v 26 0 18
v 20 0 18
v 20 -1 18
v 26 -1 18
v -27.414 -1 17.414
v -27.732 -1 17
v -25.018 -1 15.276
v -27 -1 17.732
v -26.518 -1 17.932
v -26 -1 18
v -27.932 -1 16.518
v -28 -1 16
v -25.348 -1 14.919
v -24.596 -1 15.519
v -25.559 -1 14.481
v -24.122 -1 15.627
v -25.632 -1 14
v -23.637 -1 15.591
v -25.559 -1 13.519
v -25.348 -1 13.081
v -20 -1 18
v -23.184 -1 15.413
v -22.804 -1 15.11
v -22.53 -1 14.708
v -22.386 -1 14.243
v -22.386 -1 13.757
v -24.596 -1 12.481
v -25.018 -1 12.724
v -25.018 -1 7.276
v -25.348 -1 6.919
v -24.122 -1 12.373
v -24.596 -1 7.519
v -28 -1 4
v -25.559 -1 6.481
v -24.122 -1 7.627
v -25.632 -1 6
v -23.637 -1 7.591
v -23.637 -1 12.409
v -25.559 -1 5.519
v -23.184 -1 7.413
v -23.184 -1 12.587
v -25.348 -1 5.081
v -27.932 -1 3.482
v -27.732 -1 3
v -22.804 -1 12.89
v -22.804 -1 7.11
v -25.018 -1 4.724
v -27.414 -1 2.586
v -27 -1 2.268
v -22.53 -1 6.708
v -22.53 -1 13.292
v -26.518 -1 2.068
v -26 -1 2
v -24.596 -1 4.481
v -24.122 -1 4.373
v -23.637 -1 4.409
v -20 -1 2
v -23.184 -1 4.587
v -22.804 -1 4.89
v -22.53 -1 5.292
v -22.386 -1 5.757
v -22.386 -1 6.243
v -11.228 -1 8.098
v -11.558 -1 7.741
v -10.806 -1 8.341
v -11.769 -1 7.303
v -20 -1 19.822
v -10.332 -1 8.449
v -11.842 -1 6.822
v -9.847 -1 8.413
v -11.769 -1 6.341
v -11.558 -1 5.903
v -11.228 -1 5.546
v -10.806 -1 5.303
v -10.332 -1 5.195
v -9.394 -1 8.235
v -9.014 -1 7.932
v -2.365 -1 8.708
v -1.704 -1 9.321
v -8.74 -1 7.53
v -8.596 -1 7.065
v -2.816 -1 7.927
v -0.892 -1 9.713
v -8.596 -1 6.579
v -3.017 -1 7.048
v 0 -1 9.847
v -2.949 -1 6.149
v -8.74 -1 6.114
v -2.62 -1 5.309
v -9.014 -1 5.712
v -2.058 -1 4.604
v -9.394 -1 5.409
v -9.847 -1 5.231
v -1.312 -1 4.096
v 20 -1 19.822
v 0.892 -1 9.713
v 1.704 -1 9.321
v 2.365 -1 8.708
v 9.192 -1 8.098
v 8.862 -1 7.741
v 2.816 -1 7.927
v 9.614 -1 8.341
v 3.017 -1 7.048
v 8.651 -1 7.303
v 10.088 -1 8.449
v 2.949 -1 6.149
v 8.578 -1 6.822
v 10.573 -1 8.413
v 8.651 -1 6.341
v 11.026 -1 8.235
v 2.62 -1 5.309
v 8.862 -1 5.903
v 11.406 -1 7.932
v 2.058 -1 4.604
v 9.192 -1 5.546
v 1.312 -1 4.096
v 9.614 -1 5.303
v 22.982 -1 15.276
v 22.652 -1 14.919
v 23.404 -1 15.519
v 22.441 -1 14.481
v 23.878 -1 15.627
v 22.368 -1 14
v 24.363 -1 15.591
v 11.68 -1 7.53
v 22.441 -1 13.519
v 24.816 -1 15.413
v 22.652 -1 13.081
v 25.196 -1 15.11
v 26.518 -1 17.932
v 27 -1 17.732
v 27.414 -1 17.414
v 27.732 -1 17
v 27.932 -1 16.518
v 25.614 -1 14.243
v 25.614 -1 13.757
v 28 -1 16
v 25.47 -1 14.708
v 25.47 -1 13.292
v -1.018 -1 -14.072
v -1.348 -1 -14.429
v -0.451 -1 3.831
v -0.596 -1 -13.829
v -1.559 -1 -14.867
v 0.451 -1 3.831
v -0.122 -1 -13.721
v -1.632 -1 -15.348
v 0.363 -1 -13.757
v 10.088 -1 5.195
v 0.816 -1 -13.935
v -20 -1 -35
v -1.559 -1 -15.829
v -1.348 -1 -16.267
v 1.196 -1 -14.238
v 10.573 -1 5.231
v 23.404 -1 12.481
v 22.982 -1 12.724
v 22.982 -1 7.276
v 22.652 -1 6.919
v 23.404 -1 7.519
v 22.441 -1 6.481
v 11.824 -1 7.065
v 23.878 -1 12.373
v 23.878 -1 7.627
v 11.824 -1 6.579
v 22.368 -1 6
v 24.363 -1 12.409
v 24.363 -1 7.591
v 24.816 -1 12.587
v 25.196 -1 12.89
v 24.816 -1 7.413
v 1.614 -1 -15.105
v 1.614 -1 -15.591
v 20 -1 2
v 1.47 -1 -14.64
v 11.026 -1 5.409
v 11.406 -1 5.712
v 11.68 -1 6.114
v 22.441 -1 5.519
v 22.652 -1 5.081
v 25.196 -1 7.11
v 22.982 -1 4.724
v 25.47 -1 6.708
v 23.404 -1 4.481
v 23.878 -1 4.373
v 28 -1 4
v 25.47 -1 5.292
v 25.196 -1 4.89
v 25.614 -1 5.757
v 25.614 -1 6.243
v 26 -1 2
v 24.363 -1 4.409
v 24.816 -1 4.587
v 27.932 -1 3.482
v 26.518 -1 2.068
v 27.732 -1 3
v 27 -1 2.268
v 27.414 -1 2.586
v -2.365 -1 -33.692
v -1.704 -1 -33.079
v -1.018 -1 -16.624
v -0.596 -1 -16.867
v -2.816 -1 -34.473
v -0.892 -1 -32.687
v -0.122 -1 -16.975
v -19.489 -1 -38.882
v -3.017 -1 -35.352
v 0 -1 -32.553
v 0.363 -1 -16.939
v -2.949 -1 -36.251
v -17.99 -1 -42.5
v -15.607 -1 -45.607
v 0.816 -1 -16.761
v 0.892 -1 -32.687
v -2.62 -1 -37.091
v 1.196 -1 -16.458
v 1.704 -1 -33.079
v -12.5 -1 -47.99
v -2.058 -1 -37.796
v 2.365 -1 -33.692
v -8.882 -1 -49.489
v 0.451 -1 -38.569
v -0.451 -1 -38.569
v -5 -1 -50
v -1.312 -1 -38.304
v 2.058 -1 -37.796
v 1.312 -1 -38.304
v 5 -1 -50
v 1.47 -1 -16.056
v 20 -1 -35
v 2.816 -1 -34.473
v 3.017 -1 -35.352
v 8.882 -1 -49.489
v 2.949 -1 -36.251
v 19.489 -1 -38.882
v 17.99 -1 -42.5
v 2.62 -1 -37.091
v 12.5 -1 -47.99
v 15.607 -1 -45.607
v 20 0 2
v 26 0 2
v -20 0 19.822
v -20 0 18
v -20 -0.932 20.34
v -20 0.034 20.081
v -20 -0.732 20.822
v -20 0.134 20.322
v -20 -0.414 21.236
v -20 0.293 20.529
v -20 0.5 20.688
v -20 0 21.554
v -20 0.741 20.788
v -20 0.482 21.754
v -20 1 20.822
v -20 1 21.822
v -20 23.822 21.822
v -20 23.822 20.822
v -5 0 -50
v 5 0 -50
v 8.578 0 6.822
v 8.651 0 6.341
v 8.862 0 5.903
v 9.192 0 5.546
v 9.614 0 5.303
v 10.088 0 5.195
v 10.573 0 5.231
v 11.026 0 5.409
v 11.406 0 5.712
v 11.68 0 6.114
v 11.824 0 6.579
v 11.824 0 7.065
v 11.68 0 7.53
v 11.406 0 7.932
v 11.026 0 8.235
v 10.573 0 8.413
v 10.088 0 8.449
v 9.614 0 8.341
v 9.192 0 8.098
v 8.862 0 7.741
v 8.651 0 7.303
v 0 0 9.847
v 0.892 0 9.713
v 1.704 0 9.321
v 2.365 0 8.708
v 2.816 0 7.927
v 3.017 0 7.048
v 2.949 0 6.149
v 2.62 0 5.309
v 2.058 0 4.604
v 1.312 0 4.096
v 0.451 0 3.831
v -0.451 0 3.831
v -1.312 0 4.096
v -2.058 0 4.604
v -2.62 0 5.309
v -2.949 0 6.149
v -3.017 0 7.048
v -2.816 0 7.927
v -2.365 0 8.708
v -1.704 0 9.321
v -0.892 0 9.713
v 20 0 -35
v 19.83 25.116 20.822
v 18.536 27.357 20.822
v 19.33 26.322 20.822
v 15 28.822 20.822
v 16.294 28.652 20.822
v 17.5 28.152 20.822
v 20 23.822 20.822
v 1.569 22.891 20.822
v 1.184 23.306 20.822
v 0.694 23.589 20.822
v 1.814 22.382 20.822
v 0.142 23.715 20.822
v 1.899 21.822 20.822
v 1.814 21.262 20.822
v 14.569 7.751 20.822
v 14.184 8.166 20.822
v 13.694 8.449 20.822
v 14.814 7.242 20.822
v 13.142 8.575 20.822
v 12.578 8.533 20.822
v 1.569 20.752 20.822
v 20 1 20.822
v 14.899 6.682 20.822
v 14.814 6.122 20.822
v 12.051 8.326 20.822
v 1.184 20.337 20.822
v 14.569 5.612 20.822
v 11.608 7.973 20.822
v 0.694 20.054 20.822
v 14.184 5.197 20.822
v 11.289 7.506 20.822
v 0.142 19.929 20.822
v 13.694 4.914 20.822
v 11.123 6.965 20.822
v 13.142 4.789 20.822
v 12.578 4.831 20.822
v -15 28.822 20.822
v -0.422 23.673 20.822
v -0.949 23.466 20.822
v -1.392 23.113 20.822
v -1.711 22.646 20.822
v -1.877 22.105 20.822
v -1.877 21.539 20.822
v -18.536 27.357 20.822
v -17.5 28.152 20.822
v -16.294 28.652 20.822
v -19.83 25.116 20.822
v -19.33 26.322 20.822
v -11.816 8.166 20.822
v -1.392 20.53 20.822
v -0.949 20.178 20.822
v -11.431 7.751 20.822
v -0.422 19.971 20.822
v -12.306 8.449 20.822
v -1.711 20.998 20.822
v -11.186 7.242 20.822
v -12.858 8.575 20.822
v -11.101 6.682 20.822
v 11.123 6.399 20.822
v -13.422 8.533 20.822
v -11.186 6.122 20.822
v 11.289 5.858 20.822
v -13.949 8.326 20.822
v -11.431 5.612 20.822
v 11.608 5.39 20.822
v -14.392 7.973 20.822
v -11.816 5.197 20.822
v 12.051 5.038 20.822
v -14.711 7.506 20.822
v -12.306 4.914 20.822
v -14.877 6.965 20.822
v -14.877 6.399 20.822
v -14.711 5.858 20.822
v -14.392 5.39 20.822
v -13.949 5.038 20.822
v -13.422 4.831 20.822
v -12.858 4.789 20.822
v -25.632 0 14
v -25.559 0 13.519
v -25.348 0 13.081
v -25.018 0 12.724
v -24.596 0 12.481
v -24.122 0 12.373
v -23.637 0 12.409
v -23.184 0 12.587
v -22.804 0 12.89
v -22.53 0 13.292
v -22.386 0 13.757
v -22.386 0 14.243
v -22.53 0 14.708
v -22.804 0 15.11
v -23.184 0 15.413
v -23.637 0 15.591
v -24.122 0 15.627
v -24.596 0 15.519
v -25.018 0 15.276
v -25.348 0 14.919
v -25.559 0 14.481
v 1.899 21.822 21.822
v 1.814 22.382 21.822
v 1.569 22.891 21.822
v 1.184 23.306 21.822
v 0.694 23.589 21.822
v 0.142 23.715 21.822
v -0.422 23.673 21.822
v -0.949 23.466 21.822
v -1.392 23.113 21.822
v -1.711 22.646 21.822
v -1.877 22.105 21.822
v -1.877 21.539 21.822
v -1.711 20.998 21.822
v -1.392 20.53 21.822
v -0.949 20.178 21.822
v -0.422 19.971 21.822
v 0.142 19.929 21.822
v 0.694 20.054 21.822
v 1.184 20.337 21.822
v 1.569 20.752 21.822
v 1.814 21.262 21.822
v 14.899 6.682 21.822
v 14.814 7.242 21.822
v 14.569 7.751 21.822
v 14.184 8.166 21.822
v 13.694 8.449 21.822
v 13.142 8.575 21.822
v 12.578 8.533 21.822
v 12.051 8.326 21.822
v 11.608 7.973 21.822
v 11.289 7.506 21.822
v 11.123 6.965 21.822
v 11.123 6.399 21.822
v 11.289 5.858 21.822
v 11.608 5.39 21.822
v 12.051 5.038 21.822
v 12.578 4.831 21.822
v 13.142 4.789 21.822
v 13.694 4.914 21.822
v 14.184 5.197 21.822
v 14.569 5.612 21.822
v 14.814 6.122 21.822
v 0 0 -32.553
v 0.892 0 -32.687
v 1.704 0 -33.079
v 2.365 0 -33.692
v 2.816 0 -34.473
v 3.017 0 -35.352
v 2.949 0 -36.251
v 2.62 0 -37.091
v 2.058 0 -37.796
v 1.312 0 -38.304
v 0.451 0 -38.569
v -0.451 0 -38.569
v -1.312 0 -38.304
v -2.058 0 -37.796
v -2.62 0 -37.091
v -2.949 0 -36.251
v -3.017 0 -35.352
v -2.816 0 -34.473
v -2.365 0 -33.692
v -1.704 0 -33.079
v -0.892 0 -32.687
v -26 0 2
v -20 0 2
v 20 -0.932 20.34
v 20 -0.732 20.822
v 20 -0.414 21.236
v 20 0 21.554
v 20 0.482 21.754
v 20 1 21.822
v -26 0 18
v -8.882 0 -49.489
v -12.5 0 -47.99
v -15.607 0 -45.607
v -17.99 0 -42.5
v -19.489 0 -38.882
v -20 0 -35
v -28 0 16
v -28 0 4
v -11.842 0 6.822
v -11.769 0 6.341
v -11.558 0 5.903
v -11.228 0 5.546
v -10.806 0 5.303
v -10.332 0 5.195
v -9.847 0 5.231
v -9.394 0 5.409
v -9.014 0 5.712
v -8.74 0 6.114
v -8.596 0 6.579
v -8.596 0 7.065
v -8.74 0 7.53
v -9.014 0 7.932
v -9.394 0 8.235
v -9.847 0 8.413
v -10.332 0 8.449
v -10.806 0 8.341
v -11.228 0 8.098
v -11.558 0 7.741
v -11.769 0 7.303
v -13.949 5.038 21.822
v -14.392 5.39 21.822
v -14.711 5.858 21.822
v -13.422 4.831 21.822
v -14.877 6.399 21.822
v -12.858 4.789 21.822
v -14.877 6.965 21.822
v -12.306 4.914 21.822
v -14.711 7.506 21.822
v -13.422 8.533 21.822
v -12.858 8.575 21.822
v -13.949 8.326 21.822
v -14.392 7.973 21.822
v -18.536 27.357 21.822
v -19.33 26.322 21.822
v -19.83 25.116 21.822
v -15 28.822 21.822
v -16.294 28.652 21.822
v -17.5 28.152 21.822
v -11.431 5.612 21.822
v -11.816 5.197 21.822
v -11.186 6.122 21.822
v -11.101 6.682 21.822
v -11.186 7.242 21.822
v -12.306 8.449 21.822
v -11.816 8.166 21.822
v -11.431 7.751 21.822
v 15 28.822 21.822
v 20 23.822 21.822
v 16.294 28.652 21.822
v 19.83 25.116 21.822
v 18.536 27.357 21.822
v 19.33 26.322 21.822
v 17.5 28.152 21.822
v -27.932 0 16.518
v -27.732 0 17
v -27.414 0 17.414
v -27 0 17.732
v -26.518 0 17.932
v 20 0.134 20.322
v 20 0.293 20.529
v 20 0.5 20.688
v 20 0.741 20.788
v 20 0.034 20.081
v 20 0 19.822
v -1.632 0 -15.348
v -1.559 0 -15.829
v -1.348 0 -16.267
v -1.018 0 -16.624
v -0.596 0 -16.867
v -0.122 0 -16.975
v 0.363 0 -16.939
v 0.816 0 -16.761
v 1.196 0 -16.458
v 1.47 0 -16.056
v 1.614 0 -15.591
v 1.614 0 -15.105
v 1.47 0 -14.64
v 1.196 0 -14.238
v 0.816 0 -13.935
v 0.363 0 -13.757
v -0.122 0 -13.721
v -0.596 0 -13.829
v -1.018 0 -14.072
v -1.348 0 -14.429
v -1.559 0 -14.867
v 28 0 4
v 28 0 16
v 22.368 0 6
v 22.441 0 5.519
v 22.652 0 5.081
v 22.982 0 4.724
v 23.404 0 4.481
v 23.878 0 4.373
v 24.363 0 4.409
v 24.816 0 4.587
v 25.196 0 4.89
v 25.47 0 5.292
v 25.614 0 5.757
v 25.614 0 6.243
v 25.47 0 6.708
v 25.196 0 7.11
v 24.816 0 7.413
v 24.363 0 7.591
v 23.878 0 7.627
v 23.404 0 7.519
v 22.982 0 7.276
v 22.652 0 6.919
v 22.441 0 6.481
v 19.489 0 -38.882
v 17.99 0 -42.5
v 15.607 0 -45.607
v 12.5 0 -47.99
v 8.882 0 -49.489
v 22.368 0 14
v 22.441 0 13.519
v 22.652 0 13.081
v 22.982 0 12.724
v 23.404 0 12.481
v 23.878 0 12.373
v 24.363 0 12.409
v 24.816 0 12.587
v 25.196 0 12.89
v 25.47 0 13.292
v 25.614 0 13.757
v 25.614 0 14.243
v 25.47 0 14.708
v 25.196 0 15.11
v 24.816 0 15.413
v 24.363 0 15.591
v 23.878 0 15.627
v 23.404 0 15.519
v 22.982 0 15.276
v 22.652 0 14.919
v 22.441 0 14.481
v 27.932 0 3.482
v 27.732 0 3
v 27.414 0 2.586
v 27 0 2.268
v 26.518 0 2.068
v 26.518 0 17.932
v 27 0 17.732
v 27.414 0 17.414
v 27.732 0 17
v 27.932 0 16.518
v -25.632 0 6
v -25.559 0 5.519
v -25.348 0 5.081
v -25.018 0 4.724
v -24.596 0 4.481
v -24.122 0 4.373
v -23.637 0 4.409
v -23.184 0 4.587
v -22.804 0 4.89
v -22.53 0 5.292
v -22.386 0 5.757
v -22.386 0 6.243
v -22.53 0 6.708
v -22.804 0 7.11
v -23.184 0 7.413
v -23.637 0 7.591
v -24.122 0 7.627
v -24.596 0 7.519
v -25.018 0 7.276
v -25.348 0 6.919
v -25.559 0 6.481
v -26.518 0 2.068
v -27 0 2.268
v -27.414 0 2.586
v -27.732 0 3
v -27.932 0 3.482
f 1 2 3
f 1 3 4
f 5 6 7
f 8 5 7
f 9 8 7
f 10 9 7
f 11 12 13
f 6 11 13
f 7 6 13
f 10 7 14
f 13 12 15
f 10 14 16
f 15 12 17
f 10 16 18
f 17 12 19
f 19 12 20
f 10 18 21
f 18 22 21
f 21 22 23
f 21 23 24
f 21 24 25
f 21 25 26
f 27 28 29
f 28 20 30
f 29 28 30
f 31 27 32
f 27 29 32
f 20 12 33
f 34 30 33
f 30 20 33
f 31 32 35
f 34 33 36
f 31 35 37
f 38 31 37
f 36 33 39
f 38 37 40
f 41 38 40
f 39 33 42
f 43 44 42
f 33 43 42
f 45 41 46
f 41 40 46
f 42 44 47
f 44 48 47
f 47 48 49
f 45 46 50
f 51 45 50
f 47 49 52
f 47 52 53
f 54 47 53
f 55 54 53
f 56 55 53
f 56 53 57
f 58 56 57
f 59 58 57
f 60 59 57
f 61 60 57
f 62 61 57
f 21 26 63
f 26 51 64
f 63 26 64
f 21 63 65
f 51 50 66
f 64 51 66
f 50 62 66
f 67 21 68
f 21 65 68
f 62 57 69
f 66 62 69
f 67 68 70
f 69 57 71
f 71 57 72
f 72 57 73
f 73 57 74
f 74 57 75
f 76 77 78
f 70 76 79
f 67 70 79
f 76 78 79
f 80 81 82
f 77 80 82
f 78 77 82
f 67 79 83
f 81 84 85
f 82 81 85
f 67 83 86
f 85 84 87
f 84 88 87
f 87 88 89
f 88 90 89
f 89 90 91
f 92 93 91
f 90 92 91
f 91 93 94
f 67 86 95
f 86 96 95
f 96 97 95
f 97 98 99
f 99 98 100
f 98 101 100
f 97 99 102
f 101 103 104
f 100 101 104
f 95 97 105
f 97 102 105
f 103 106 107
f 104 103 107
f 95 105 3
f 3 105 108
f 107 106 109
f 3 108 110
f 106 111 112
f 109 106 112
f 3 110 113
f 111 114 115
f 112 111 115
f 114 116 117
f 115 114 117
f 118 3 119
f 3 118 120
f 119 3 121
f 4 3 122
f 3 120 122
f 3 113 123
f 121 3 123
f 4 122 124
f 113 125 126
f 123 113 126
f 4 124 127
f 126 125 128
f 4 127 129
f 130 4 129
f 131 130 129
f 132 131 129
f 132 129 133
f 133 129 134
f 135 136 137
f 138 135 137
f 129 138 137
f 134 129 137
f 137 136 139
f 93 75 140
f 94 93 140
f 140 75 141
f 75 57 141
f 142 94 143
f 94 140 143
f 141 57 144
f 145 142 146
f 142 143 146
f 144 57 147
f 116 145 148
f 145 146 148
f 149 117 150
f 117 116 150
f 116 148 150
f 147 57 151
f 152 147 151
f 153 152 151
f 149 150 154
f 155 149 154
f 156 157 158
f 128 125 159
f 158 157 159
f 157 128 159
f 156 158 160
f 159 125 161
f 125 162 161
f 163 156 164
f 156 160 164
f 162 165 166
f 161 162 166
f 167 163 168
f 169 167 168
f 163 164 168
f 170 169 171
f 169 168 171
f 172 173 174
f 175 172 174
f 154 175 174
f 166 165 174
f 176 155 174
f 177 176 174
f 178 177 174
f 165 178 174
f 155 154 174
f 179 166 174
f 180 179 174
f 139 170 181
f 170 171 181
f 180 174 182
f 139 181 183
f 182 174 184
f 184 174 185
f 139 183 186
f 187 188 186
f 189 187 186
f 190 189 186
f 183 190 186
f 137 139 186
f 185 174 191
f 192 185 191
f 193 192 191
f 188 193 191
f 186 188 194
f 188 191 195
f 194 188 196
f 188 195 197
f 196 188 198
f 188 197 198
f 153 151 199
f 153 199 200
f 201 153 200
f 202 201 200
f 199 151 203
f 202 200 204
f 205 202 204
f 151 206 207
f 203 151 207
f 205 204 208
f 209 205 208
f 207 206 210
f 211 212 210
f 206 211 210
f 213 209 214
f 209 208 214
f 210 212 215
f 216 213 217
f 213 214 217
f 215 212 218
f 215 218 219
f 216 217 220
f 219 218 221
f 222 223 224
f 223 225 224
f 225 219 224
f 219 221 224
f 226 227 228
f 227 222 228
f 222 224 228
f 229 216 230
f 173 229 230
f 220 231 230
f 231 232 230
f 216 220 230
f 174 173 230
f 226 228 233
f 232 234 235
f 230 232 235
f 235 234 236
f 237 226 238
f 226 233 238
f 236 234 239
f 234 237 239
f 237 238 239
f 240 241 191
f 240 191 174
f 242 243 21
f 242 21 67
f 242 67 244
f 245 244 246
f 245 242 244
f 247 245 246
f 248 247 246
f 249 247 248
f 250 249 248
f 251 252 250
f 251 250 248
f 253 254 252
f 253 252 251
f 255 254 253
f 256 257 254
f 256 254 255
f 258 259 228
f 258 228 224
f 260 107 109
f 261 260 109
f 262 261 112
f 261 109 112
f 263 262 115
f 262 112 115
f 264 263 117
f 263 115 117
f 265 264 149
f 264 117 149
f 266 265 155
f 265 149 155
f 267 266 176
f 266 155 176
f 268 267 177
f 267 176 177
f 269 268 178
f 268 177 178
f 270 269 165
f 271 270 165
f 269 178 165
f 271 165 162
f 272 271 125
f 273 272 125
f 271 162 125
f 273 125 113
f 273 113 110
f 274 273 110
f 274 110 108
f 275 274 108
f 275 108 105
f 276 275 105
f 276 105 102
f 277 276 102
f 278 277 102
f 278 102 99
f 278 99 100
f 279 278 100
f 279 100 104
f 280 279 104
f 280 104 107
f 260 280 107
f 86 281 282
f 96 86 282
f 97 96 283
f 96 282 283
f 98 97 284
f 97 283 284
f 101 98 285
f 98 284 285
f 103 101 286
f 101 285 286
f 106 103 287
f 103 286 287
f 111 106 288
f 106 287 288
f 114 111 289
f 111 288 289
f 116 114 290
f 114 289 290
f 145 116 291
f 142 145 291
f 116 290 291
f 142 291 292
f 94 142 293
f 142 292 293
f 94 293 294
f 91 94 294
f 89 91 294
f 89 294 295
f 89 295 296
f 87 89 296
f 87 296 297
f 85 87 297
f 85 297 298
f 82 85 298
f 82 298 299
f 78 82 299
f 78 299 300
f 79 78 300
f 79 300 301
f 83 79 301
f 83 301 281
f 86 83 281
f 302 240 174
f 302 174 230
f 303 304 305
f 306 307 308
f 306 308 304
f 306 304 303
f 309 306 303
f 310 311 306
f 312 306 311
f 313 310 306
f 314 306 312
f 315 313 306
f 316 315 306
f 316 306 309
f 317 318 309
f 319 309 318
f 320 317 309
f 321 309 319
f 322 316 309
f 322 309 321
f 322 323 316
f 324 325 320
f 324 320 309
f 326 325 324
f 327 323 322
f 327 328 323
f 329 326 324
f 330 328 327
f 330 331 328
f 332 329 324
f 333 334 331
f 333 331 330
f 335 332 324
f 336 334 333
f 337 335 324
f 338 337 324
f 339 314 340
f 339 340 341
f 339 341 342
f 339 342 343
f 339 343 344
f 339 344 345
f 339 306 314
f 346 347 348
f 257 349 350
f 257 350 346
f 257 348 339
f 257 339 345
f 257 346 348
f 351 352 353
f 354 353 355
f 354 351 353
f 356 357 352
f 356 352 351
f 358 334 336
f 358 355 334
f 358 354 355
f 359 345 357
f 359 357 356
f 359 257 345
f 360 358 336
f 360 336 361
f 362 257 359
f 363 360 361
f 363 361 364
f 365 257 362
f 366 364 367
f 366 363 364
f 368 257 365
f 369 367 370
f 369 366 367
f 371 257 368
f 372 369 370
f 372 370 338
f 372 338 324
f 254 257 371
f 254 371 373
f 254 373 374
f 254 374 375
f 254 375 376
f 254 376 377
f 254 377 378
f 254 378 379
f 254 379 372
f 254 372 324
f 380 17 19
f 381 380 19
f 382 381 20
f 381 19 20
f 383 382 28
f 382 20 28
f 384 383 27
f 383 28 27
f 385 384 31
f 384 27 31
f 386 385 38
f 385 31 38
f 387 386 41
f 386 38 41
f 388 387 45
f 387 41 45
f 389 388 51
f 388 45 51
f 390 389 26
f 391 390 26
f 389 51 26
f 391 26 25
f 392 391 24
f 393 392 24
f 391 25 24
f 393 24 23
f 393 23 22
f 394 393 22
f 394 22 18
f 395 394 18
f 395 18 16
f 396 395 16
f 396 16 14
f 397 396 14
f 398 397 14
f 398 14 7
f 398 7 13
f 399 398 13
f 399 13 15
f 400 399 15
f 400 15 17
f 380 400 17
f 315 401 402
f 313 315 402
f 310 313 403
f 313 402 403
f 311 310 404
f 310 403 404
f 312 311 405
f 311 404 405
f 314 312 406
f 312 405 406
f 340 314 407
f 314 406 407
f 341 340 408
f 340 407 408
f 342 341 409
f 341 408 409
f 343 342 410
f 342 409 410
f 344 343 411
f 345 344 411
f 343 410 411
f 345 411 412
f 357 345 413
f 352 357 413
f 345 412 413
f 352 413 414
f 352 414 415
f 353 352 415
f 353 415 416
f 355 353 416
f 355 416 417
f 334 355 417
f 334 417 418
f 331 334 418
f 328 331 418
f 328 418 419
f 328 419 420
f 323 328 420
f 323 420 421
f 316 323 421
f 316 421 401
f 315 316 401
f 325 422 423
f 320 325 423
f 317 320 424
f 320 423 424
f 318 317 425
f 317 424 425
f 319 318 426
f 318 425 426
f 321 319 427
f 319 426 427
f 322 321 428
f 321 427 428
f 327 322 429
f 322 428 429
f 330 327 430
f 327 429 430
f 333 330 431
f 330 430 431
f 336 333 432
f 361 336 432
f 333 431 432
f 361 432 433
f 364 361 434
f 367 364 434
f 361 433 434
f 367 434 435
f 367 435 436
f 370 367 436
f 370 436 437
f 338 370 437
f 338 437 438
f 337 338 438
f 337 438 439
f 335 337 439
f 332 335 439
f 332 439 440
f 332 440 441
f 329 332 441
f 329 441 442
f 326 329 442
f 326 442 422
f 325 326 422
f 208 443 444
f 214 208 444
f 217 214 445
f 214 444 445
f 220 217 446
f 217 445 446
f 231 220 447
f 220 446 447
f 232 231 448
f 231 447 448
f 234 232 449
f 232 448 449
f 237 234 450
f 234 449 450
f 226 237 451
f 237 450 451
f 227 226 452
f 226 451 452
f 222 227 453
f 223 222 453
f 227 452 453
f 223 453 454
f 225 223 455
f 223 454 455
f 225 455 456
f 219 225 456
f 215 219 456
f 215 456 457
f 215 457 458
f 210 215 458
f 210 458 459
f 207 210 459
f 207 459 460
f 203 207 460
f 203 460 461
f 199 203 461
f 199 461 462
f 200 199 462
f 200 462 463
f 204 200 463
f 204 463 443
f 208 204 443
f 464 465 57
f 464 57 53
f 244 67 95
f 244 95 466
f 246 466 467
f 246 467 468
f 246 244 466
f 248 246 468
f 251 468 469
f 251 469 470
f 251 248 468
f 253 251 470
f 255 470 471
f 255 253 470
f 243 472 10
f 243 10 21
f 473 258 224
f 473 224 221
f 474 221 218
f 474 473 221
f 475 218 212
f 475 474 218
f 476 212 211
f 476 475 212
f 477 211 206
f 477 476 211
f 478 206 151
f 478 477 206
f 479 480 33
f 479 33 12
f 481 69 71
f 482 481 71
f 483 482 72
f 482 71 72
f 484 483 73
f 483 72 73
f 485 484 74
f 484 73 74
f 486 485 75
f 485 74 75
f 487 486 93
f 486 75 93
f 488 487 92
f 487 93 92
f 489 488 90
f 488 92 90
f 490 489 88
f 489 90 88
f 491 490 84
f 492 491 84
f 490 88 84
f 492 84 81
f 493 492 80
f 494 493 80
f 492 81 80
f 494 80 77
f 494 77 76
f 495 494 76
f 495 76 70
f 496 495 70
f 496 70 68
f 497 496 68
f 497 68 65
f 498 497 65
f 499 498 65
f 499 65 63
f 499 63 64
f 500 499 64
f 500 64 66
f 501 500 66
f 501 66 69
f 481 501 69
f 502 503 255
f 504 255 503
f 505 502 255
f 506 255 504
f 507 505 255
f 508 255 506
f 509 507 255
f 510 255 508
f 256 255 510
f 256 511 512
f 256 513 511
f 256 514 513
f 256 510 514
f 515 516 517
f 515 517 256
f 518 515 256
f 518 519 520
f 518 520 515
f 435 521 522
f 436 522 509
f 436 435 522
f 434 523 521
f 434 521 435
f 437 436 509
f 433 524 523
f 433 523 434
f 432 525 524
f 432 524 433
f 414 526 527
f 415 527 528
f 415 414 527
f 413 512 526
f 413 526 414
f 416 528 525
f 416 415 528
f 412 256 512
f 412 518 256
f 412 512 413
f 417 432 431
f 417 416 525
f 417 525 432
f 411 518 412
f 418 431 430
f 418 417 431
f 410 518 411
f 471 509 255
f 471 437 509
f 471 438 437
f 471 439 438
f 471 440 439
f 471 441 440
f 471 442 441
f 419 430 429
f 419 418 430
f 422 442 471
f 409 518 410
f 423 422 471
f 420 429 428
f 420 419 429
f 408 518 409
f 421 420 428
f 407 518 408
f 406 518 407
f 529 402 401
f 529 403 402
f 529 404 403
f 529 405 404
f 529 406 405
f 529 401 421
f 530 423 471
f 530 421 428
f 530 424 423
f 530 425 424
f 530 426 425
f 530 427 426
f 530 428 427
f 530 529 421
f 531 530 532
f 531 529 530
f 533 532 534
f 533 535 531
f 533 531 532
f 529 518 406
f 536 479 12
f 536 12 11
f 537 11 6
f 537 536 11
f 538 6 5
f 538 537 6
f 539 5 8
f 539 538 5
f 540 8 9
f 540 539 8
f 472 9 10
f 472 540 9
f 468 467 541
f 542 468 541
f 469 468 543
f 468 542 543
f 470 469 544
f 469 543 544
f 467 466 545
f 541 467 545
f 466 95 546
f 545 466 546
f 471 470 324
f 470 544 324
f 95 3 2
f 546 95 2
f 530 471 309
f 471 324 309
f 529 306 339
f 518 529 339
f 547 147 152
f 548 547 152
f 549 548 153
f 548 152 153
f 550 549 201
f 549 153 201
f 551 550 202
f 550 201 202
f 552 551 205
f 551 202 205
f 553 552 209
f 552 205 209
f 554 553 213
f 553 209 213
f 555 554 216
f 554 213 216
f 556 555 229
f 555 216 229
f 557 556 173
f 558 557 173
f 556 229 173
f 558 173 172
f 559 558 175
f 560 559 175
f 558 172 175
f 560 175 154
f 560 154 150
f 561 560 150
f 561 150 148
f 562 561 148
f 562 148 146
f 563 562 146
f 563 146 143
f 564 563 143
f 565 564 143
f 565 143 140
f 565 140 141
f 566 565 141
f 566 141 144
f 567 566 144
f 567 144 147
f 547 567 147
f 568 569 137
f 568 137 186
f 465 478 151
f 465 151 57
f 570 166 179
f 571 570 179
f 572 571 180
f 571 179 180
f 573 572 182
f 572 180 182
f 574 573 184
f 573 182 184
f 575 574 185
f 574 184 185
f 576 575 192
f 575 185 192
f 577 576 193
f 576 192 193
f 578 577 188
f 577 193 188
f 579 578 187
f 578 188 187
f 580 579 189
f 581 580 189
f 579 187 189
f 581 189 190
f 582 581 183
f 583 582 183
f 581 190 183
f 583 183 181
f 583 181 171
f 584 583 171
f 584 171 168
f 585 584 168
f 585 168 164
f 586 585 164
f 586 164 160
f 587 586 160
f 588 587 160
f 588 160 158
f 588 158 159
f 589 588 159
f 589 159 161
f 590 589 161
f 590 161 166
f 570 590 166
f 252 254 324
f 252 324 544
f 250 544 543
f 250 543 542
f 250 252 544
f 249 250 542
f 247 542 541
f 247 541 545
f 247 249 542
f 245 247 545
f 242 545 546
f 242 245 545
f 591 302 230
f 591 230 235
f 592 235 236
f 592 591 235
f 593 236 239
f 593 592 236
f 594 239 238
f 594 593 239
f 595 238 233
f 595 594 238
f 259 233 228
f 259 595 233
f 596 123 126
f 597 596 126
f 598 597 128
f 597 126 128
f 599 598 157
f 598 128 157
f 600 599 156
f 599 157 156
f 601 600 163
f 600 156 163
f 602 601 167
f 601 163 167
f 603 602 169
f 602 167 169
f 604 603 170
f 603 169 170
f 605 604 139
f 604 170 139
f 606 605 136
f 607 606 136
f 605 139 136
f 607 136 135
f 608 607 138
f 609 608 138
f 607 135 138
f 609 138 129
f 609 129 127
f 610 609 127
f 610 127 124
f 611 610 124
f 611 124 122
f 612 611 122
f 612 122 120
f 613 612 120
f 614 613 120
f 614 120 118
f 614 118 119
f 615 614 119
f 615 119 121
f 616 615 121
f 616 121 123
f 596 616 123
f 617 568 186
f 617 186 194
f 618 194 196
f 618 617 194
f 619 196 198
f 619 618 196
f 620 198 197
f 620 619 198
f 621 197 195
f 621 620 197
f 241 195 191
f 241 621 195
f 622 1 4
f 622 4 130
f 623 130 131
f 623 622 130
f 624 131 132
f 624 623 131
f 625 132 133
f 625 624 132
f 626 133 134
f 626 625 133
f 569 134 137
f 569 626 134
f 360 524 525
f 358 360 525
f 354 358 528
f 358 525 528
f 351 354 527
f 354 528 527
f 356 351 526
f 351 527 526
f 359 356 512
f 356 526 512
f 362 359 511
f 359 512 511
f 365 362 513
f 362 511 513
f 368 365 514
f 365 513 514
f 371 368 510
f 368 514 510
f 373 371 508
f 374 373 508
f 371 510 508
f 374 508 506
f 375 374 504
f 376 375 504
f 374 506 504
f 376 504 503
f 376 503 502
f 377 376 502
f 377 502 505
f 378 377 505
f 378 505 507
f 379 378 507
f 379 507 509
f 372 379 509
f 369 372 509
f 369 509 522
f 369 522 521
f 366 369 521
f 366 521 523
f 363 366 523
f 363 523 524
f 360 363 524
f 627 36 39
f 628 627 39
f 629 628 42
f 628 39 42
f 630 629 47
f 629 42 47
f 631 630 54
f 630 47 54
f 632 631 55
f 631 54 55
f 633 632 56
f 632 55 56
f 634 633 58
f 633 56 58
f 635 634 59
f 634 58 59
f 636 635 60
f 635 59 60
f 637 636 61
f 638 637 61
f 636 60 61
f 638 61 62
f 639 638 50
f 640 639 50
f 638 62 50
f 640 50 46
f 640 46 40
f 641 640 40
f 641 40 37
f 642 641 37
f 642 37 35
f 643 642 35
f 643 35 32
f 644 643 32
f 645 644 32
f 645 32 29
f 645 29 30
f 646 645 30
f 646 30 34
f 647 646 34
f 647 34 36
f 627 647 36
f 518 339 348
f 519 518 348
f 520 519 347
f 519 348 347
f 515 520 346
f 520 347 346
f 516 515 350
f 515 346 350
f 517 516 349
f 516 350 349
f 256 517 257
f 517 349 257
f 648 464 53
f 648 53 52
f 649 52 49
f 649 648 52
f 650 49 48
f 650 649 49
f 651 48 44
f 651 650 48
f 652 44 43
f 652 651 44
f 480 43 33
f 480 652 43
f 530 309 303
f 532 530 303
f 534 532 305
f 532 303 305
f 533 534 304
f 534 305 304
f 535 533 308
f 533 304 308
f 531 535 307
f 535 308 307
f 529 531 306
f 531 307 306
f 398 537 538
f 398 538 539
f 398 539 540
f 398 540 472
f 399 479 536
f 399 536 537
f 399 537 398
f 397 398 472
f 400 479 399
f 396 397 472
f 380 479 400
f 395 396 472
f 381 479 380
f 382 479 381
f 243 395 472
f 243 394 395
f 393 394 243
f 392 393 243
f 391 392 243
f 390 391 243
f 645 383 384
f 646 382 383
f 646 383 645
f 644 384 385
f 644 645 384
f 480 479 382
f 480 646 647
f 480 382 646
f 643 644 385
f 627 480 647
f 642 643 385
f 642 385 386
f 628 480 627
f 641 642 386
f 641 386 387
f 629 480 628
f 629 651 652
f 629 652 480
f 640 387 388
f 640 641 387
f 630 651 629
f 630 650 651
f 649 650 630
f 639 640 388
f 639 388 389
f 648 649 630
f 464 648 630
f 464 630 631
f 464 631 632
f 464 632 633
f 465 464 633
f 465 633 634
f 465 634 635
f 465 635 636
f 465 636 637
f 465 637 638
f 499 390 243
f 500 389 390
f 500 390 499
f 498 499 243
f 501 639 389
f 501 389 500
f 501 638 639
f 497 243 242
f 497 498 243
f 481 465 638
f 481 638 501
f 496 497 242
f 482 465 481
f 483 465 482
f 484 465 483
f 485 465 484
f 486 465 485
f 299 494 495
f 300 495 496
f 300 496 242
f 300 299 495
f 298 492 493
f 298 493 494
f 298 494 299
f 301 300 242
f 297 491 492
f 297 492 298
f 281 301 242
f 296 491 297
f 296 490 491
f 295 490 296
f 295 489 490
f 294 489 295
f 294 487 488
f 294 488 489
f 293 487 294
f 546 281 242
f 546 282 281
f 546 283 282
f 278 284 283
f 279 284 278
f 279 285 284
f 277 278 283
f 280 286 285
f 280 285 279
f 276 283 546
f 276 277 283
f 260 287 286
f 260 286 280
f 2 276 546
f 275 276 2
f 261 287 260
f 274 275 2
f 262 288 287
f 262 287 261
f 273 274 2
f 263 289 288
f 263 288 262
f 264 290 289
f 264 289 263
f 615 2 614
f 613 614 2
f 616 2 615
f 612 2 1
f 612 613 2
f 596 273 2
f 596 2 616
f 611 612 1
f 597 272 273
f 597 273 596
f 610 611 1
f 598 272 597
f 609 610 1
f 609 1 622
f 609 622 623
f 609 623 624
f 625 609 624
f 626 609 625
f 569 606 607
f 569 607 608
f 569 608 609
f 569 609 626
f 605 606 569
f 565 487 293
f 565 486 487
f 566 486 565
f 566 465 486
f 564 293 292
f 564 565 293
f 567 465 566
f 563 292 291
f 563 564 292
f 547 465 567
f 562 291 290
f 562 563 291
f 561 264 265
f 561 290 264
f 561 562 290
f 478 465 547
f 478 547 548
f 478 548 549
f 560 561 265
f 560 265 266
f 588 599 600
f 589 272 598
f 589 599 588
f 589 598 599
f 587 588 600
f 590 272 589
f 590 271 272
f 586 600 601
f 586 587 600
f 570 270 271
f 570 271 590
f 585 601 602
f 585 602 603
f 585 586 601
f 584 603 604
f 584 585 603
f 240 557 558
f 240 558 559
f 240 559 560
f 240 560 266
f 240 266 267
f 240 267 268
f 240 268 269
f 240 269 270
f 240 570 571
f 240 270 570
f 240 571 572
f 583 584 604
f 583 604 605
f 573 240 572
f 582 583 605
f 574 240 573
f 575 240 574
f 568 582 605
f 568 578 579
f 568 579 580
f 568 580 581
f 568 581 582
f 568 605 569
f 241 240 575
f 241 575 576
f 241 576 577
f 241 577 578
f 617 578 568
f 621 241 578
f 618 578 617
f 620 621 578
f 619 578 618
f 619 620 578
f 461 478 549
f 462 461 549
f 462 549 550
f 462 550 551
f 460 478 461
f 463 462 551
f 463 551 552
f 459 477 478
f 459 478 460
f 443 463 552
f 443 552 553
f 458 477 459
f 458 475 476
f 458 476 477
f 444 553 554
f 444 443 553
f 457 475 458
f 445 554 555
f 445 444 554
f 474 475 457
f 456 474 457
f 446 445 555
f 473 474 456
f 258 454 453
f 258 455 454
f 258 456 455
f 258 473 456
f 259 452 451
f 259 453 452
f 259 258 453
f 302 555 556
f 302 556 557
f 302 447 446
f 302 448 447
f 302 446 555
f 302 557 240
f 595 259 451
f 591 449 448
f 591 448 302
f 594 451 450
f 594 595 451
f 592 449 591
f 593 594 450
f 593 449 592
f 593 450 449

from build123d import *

# Parameters (mm, degrees)
BASE_FLANGE1_DEPTH       = 1
SKETCHED_START           = 21.616422755
SKETCHED_BEND1_OUTLINE_W = 40
SKETCHED_BEND1_OUTLINE_H = 1
SKETCHED_BEND1_DEPTH     = 28.383577245
SKETCHED_START_2         = 20.821902755
SKETCHED_BEND1_2_DEPTH   = 0.00548
SKETCHED_START_3         = 19.821902755
SKETCHED_BEND1_3_DEPTH   = 2
SKETCHED_START_4         = -20
SKETCHED_BEND1_4_DEPTH   = 40
SKETCH7_R                = 3.025
CUT_EXTRUDE1_DEPTH       = 10
F_4_CLEARANCE_HOLE1_D    = 3.2639
F_6_CLEARANCE_HOLE1_D    = 3.7973
F_4_CLEARANCE_HOLE2_D    = 3.2639


with BuildPart() as part:
    # Base-Flange1: sheet metal written as solids
    # Sketch1 → Base-Flange1 (new body)
    with BuildSketch(Plane(origin=(0, 0, 0), x_dir=(1, 0, 0), z_dir=(0, 1, 0))):
        with BuildLine():
            Line((-20, -18), (-20, -45))
            ThreePointArc((-20, -45), (-18.535533906, -48.535533906), (-15, -50))
            Line((-15, -50), (15, -50))
            ThreePointArc((15, -50), (18.535533906, -48.535533906), (20, -45))
            Line((20, -45), (20, -18))
            Line((20, -18), (26, -18))
            ThreePointArc((26, -18), (27.414213562, -17.414213562), (28, -16))
            Line((28, -16), (28, -4))
            ThreePointArc((28, -4), (27.414213562, -2.585786438), (26, -2))
            Line((26, -2), (20, -2))
            Line((20, -2), (20, 35))
            ThreePointArc((20, 35), (15.606601718, 45.606601718), (5, 50))
            Line((5, 50), (-5, 50))
            ThreePointArc((-5, 50), (-15.606601718, 45.606601718), (-20, 35))
            Line((-20, 35), (-20, -2))
            Line((-20, -2), (-26, -2))
            ThreePointArc((-26, -2), (-27.414213562, -2.585786438), (-28, -4))
            Line((-28, -4), (-28, -16))
            ThreePointArc((-28, -16), (-27.414213562, -17.414213562), (-26, -18))
            Line((-26, -18), (-20, -18))
        make_face()
    extrude(amount=-BASE_FLANGE1_DEPTH)

    # Sketched Bend1: read off the stored shape, not the designer's step
    # Sketched Bend1 outline → Sketched Bend1 (cut)
    with BuildSketch(Plane.XY.offset(SKETCHED_START)):
        with Locations((0, -0.5)):
            Rectangle(SKETCHED_BEND1_OUTLINE_W, SKETCHED_BEND1_OUTLINE_H)
    extrude(amount=SKETCHED_BEND1_DEPTH, mode=Mode.SUBTRACT)

    # Sketched Bend1 2 outline → Sketched Bend1 2 (add)
    with BuildSketch(Plane.XY.offset(SKETCHED_START_2)):
        with BuildLine():
            Line((20, 0), (20, 23.821902755))
            ThreePointArc((20, 23.821902755), (18.535533906, 27.357436661), (15, 28.821902755))
            Line((15, 28.821902755), (-15, 28.821902755))
            ThreePointArc((-15, 28.821902755), (-18.535533906, 27.357436661), (-20, 23.821902755))
            Line((-20, 23.821902755), (-20, 0))
            Line((-20, 0), (20, 0))
        make_face()
    extrude(amount=SKETCHED_BEND1_2_DEPTH)

    # Sketched Bend1 3 outline → Sketched Bend1 3 (add)
    with BuildSketch(Plane.XY.offset(SKETCHED_START_3)):
        with BuildLine():
            Line((20, 0), (20, 23.821902755))
            ThreePointArc((20, 23.821902755), (18.535533906, 27.357436661), (15, 28.821902755))
            Line((15, 28.821902755), (-15, 28.821902755))
            ThreePointArc((-15, 28.821902755), (-18.535533906, 27.357436661), (-20, 23.821902755))
            Line((-20, 23.821902755), (-20, 0))
            Line((-20, 0), (20, 0))
        make_face()
    extrude(amount=SKETCHED_BEND1_3_DEPTH)

    # Sketched Bend1 4 outline → Sketched Bend1 4 (cut)
    with BuildSketch(Plane.YZ.offset(SKETCHED_START_4)):
        with BuildLine():
            Line((28.821902755, 19.821902755), (28.821902755, 20.821902755))
            Line((28.821902755, 20.821902755), (1, 20.821902755))
            ThreePointArc((1, 20.821902755), (0.292893219, 20.529009536), (0, 19.821902755))
            Line((0, 19.821902755), (28.821902755, 19.821902755))
        make_face()
        with BuildLine():
            ThreePointArc((-1, 19.821902755), (-0.414213562, 21.236116317), (1, 21.821902755))
            Line((1, 21.821902755), (0, 21.821902755))
            Line((0, 21.821902755), (0, 21.616422755))
            Line((0, 21.616422755), (-1, 21.616422755))
            Line((-1, 21.616422755), (-1, 19.821902755))
        make_face()
    extrude(amount=SKETCHED_BEND1_4_DEPTH, mode=Mode.SUBTRACT)

    # Sketch7 → Cut-Extrude1 (cut)
    with BuildSketch(Plane(origin=(0, 0, 0), x_dir=(1, 0, 0), z_dir=(0, 1, 0))):
        with Locations(Location((0, -6.821902755, 0), (0, 0, 270))):
            Circle(SKETCH7_R)
        with Locations(Location((0, 35.578097245, 0), (0, 0, 270))):
            Circle(SKETCH7_R)
    extrude(amount=-CUT_EXTRUDE1_DEPTH, mode=Mode.SUBTRACT)

    # #4 Clearance Hole1 (through all)
    with Locations(Plane(origin=(0, 0, 0), x_dir=(1, 0, 0), z_dir=(0, 1, 0))):
        with Locations((0, 15.348097245), (-10.21, -6.821902755), (10.21, -6.821902755)):
            Hole(F_4_CLEARANCE_HOLE1_D / 2)

    # #6 Clearance Hole1 (through all)
    with Locations(Plane(origin=(0, 0, 20.821902755), x_dir=(-1, 0, 0), z_dir=(0, 0, -1))):
        with Locations((13, 6.681902755), (-13, 6.681902755), (0, 21.821902755)):
            Hole(F_6_CLEARANCE_HOLE1_D / 2)

    # #4 Clearance Hole2 (through all)
    with Locations(Plane(origin=(0, 0, 0), x_dir=(1, 0, 0), z_dir=(0, 1, 0))):
        with Locations((-24, -6), (-24, -14), (24, -6), (24, -14)):
            Hole(F_4_CLEARANCE_HOLE2_D / 2)


solid = part.part
